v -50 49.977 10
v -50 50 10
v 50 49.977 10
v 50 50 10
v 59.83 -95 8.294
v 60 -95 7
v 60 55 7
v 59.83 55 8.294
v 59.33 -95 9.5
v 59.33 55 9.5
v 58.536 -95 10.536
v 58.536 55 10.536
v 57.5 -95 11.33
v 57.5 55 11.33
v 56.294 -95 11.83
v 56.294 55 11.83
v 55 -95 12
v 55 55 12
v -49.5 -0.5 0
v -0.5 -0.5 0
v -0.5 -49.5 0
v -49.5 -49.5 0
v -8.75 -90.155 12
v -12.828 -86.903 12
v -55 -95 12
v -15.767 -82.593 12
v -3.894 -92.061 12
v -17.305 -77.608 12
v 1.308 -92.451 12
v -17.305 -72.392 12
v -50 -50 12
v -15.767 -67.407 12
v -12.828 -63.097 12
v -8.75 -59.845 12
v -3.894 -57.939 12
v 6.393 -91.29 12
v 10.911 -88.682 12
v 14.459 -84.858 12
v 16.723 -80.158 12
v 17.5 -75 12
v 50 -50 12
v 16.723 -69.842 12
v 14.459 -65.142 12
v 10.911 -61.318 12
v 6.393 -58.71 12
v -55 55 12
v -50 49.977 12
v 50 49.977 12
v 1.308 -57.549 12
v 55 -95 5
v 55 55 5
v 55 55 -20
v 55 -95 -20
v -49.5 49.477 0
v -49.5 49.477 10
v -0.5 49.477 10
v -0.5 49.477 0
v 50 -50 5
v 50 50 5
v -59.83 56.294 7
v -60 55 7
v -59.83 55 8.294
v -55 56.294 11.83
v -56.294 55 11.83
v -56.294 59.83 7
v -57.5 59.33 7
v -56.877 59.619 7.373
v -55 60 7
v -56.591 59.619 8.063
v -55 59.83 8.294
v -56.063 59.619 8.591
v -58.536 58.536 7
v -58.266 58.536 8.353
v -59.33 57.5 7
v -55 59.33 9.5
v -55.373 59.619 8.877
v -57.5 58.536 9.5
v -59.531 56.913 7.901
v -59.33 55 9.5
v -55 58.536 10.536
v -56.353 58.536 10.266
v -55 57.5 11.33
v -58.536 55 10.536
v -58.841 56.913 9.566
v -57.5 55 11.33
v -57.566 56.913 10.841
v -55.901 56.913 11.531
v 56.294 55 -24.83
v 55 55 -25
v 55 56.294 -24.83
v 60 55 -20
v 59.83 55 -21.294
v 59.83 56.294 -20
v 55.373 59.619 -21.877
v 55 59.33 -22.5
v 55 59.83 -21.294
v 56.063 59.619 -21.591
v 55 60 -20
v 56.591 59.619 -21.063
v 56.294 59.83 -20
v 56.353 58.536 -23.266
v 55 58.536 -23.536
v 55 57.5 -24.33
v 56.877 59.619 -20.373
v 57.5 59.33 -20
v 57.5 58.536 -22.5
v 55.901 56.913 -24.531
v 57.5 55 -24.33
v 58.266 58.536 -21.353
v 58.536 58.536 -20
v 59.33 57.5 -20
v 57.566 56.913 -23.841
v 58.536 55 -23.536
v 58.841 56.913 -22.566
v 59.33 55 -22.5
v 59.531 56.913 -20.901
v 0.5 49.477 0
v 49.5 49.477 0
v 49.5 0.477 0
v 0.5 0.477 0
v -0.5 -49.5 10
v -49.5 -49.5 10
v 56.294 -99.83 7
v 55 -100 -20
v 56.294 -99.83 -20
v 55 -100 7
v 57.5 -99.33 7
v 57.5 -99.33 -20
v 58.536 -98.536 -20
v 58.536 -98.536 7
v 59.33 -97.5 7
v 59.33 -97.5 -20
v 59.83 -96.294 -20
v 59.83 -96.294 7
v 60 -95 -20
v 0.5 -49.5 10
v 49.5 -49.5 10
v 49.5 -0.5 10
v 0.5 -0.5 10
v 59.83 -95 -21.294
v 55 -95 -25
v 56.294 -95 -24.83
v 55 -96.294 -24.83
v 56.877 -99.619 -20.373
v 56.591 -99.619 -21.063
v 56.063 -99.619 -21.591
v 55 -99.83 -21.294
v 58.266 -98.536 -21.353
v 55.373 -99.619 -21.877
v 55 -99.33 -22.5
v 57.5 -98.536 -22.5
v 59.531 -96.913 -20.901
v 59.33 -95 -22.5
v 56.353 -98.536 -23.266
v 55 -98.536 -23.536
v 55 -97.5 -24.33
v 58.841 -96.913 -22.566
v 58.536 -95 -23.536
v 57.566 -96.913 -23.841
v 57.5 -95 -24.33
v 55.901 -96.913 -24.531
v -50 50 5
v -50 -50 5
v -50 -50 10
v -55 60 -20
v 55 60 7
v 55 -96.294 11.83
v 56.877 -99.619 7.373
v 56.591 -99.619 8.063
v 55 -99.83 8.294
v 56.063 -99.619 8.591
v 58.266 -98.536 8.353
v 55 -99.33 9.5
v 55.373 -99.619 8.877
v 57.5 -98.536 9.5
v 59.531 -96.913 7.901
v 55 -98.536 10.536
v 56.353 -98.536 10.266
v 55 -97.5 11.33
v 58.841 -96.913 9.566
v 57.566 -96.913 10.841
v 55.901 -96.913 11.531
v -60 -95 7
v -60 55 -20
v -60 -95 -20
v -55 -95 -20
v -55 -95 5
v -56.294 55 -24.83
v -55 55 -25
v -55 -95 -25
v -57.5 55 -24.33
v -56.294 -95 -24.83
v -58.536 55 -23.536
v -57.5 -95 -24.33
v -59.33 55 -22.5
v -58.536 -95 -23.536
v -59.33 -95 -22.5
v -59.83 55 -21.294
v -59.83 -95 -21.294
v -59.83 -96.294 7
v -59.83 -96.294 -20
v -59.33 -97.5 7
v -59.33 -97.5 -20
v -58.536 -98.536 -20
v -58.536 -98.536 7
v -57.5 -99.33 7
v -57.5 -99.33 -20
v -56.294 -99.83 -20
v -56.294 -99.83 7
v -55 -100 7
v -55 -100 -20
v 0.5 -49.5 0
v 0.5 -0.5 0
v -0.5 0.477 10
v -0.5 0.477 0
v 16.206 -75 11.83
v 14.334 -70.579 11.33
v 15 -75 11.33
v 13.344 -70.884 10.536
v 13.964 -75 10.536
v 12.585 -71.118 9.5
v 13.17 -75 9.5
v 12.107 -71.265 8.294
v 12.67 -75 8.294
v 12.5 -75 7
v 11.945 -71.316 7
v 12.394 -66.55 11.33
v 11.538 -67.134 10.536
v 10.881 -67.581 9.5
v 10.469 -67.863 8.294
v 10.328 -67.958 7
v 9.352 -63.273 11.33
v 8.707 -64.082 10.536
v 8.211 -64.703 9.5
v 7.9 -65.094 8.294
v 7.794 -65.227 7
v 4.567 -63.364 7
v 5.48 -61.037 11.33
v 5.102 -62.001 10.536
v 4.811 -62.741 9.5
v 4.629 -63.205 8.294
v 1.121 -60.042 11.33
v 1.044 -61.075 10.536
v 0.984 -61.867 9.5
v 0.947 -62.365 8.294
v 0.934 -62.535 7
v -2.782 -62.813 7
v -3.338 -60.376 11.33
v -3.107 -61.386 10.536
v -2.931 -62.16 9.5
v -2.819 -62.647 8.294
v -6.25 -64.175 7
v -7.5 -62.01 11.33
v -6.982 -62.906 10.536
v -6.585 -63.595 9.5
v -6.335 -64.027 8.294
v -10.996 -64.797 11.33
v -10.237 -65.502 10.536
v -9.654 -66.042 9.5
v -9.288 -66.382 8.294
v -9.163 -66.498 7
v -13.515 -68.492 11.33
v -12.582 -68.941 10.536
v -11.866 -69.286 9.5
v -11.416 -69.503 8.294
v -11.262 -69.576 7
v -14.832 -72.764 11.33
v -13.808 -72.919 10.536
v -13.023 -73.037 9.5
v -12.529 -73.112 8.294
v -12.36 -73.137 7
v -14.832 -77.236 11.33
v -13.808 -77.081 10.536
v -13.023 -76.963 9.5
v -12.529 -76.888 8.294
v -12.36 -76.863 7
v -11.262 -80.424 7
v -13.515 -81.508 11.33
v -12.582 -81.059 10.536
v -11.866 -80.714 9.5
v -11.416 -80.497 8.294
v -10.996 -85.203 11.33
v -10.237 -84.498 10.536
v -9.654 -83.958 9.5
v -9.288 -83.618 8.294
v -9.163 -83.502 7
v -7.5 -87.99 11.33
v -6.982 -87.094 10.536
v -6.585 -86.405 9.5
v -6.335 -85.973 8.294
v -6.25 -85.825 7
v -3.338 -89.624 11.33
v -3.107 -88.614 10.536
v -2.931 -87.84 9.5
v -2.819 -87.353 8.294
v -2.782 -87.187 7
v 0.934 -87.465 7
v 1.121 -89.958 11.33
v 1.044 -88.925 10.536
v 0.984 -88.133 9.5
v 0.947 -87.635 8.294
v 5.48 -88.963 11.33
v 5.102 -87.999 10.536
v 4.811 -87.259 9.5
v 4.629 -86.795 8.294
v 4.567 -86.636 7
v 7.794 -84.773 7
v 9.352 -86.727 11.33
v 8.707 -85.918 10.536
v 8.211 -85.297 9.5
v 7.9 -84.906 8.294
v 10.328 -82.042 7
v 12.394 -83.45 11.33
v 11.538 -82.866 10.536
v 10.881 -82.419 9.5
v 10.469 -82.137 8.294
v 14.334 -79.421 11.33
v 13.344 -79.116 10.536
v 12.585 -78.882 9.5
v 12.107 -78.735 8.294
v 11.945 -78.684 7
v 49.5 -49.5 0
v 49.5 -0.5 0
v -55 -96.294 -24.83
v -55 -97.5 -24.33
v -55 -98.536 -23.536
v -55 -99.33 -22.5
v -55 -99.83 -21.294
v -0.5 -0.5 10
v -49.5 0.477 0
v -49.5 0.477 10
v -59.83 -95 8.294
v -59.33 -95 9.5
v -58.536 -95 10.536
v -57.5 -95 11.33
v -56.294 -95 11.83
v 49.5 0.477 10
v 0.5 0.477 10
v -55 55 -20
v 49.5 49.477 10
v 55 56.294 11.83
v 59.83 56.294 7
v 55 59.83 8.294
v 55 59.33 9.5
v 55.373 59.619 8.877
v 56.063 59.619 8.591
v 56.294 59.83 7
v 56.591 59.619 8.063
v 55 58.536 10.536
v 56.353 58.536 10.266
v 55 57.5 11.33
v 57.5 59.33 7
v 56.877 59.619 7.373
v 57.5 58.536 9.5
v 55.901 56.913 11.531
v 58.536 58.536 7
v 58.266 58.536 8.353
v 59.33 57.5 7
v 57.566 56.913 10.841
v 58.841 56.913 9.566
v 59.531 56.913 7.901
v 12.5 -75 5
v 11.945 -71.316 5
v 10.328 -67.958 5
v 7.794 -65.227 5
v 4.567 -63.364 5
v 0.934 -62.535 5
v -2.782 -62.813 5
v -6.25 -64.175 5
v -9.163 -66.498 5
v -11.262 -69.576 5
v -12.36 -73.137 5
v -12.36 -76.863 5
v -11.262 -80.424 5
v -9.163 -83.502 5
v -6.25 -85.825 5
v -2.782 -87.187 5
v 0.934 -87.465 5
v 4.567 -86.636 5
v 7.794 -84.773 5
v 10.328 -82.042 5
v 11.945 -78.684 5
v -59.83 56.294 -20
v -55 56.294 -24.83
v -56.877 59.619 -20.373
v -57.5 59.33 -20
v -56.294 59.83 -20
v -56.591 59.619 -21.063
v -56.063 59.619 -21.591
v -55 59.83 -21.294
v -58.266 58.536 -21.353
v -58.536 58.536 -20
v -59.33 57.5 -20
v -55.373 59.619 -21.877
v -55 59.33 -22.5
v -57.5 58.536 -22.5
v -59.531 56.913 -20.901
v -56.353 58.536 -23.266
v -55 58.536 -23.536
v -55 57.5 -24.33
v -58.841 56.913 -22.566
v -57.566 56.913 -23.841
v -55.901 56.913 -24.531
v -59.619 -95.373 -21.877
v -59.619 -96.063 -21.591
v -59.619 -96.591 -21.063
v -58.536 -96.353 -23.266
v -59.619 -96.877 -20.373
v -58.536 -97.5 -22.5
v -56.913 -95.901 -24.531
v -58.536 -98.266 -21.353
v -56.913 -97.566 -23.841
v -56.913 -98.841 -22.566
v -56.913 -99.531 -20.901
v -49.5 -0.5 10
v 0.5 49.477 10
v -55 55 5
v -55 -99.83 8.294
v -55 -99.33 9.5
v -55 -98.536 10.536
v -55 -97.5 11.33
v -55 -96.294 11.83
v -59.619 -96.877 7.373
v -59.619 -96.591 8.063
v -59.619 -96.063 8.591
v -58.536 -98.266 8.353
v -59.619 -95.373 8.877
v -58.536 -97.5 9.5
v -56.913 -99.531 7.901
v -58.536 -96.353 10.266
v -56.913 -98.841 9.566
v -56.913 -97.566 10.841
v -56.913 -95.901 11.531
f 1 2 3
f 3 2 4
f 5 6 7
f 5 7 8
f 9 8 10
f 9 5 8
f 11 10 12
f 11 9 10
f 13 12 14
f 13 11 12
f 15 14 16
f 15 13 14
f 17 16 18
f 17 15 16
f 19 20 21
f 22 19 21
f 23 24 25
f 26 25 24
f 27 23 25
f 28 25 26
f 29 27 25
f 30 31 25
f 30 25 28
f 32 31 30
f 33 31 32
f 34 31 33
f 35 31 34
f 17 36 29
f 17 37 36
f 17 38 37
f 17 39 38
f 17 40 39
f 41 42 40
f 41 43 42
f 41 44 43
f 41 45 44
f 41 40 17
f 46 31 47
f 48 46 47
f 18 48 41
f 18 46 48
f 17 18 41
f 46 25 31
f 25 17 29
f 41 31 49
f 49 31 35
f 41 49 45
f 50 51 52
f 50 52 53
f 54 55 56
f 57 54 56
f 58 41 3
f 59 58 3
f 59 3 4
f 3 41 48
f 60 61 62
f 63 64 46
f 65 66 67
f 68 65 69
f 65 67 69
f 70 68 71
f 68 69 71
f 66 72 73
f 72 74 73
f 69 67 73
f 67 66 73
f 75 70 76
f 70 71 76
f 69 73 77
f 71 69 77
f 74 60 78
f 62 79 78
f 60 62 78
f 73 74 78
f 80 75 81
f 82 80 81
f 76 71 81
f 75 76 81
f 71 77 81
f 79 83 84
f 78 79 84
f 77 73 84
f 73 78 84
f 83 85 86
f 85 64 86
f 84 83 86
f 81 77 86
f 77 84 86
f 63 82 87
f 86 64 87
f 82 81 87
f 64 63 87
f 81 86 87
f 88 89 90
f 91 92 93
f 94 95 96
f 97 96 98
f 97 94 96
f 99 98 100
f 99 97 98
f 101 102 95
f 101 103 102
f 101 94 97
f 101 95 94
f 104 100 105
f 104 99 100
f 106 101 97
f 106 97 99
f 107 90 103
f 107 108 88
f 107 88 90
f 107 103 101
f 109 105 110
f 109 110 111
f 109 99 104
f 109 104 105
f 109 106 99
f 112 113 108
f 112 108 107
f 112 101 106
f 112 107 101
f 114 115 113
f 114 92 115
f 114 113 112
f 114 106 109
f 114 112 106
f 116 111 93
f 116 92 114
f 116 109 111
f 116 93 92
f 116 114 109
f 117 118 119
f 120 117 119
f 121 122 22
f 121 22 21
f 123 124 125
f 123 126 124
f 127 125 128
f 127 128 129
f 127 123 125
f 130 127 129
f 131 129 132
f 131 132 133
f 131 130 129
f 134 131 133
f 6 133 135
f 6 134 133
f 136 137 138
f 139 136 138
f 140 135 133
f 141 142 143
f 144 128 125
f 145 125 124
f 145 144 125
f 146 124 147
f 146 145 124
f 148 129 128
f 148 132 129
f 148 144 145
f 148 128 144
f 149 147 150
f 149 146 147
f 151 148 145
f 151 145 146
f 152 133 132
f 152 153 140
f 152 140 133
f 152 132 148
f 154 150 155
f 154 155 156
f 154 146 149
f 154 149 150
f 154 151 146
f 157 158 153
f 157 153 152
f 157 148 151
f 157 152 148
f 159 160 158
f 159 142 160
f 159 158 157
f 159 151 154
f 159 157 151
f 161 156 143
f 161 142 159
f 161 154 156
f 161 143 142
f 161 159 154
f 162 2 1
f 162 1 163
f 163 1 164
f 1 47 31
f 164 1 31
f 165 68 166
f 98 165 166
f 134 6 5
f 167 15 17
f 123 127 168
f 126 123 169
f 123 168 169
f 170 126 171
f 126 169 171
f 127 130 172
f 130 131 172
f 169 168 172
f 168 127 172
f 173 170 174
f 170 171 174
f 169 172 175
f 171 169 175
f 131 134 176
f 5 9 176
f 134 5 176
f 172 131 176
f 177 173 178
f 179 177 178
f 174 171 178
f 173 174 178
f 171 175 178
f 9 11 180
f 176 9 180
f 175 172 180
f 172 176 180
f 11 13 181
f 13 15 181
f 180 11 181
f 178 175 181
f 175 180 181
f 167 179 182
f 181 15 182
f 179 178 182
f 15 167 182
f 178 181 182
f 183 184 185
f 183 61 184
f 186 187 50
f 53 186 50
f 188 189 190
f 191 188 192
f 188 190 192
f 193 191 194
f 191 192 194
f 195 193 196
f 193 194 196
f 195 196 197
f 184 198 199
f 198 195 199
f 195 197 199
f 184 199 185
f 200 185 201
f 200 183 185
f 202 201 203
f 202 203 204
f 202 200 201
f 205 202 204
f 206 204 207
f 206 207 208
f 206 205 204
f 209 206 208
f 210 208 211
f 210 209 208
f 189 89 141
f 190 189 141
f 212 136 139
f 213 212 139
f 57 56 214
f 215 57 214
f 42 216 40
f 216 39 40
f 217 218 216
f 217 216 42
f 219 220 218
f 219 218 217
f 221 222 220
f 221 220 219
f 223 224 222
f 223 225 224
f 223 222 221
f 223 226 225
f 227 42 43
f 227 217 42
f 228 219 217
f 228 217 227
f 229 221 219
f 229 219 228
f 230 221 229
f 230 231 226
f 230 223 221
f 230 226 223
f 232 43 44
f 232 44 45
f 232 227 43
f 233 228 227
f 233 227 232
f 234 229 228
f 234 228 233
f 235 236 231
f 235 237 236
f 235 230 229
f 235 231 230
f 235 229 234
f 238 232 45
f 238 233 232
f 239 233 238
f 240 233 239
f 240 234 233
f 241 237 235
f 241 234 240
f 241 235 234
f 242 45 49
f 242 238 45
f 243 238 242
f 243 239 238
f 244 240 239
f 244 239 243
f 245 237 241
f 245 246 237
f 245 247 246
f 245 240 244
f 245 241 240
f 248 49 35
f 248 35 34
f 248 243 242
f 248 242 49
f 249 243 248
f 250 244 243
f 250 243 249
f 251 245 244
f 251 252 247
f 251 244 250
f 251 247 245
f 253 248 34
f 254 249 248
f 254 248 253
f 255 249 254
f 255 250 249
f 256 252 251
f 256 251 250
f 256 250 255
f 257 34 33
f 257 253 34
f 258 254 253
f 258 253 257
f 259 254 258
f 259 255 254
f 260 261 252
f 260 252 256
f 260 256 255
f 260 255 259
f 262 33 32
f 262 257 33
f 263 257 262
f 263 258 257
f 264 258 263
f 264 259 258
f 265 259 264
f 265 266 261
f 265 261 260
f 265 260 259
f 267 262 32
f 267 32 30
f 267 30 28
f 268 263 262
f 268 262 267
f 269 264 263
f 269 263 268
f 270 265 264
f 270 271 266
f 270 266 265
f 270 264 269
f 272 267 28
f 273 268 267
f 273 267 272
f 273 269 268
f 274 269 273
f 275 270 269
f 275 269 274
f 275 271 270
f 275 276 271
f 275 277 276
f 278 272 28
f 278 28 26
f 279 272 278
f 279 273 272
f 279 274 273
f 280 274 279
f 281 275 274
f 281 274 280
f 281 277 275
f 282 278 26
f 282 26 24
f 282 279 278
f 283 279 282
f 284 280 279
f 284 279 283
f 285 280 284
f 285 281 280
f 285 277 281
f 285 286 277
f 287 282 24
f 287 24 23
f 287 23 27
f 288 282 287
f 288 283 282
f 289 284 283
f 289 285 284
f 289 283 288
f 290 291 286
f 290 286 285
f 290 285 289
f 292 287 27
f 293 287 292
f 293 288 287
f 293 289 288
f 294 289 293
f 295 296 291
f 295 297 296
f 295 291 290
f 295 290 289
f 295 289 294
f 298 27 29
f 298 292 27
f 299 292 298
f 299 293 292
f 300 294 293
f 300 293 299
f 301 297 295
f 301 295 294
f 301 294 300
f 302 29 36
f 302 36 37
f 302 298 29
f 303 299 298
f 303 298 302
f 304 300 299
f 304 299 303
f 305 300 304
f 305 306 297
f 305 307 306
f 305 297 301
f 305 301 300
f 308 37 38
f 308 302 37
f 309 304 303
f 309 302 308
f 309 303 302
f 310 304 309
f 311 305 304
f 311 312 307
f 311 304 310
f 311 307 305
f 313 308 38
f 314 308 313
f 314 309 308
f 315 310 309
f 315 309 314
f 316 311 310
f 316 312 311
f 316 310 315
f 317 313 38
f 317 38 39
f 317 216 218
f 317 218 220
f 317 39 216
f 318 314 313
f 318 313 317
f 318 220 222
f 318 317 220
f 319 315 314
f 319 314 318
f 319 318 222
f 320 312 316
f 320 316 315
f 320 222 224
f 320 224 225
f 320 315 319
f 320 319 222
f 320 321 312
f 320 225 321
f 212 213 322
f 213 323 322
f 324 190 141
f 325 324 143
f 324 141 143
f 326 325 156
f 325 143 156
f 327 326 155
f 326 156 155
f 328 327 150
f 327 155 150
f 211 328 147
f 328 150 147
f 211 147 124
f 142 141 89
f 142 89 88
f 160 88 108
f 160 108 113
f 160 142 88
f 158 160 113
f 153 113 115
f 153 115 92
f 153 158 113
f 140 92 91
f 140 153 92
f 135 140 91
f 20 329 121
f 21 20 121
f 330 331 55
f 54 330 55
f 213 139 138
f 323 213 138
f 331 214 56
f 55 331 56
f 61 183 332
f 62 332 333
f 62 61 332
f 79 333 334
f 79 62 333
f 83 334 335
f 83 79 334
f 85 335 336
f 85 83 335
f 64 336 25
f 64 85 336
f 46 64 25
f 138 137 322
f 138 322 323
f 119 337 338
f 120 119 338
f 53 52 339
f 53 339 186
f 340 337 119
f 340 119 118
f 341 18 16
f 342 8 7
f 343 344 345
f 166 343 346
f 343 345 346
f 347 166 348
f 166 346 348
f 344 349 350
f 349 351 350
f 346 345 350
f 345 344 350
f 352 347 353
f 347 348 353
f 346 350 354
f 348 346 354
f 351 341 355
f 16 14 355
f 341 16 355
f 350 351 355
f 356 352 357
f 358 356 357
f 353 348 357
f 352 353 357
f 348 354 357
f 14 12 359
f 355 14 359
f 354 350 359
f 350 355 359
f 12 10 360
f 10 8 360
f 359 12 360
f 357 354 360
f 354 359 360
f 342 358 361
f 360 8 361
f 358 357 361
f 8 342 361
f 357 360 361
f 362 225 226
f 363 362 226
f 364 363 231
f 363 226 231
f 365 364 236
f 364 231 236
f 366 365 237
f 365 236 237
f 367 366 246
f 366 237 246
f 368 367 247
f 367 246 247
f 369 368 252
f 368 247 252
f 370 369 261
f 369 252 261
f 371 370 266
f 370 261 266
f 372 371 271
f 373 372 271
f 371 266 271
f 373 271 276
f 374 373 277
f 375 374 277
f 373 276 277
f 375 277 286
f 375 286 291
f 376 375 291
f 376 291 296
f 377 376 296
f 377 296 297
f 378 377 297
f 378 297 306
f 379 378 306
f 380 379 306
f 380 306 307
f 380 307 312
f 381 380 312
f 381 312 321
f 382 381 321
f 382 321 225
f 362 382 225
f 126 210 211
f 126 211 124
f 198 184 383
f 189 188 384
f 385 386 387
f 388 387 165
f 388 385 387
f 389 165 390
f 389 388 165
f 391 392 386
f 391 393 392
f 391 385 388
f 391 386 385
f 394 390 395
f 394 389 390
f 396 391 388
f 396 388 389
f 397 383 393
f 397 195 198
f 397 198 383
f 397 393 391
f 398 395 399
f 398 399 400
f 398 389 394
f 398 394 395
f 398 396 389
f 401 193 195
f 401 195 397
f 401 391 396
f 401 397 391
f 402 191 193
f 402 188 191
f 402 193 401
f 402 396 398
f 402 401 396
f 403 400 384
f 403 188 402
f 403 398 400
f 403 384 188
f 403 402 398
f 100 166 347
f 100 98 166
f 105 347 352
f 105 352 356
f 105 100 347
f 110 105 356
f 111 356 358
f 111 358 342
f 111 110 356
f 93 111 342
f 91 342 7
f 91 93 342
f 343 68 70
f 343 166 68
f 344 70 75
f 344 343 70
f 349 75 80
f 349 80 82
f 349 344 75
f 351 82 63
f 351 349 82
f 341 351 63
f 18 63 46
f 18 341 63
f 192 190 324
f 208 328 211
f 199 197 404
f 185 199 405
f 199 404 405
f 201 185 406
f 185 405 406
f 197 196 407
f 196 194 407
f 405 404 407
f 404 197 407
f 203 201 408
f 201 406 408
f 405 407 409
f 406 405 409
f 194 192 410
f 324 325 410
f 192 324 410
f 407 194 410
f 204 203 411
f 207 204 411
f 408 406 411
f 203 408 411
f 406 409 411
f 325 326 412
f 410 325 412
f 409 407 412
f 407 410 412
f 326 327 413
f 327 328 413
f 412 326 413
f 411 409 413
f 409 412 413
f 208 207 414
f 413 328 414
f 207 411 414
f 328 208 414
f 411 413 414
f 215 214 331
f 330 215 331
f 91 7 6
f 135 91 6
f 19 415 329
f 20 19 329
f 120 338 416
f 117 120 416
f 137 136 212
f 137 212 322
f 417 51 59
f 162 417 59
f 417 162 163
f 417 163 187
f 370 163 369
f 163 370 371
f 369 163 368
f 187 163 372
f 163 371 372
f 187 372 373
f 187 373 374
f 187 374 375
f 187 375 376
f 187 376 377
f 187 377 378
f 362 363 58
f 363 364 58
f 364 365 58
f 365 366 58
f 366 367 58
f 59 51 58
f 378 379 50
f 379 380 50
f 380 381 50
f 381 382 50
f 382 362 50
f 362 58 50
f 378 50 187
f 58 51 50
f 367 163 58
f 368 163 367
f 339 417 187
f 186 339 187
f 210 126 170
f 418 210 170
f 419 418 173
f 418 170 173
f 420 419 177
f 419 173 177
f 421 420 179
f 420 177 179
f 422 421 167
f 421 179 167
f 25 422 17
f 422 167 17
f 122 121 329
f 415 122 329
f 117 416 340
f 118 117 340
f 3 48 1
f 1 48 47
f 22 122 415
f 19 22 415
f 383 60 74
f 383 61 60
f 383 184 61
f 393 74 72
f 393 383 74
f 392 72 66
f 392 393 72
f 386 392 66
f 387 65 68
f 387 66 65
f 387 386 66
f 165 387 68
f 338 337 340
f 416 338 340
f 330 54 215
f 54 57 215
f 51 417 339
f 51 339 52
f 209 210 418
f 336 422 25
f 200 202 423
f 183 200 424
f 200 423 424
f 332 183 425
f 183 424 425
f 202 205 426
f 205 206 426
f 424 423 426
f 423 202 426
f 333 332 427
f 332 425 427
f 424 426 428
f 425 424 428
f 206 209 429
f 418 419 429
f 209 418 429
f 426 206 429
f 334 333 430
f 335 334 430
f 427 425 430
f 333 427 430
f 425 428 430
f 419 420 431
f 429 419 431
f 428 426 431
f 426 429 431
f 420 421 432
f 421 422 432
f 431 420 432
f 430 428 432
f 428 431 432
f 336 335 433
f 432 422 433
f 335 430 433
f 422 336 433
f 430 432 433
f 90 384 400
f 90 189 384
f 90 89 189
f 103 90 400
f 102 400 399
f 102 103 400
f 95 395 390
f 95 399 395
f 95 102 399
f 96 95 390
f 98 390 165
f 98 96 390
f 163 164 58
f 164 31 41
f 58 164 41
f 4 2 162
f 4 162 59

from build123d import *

# Parameters (mm, degrees)
F0_W      = 100
F0_H      = 100
F1_DEPTH  = 10
F2_W      = 100
F2_H      = 5
F3_DEPTH  = 50
F4_W      = 100
F4_H      = 50
F5_DEPTH  = 2
F7_DEPTH  = 10
F8_W      = 10
F8_H      = 100
F9_DEPTH  = 2
F11_DEPTH = 10
F12_W     = 100
F12_H     = 10.0225633383
F13_DEPTH = 2
F15_DEPTH = 10
F16_W     = 10
F16_H     = 99.9774366617
F17_DEPTH = 2
F19_DEPTH = 10
F20_W     = 10
F20_H     = 100
F21_DEPTH = 5
F22_R     = 12.5
F23_DEPTH = 7.00859
F24_W     = 100
F24_H     = 100
F24_W_2   = 99
F24_H_2   = 98.9774366617
F25_DEPTH = 10
F26_W     = 120
F26_H     = 160
F26_W_2   = 110
F26_H_2   = 150
F27_DEPTH = 30
F28_W     = 150
F28_H     = 5
F29_DEPTH = 110
F30_R     = 5


with BuildPart() as f1:
    # F0 (on Top) → F1 (new body)
    with BuildSketch(Plane.XY):
        Rectangle(F0_W, F0_H)
    extrude(amount=F1_DEPTH)

    # F2 (on face) → F3 (join)
    with BuildSketch(Plane.XZ.offset(50)):
        with Locations((0, 7.5)):
            Rectangle(F2_W, F2_H)
    extrude(amount=F3_DEPTH)

    # F4 (on face) → F5 (join)
    with BuildSketch(Plane.XY.offset(10)):
        with Locations((0, -75)):
            Rectangle(F4_W, F4_H)
    extrude(amount=F5_DEPTH)

    # F6 (on face) → F7 (join)
    with BuildSketch(Plane.YZ.offset(50)):
        Polygon((-100, 5), (-50, 5), (50, 5), (50, 10), (-50, 10), (-50, 12), (-100, 12), align=None)
    extrude(amount=F7_DEPTH)

    # F8 (on face) → F9 (join)
    with BuildSketch(Plane.XY.offset(10)):
        with Locations((55, 0)):
            Rectangle(F8_W, F8_H)
    extrude(amount=F9_DEPTH)

    # F10 (on face) → F11 (join)
    with BuildSketch(Plane(origin=(0, 50, 0), x_dir=(-1, 0, 0), z_dir=(0, 1, 0))):
        Polygon((-60, 5), (-50, 5), (50, 5), (50, 10), (-50, 10), (-50, 12), (-60, 12), align=None)
    extrude(amount=F11_DEPTH)

    # F12 (on face) → F13 (join)
    with BuildSketch(Plane.XY.offset(10)):
        with Locations((0, 54.9887183309)):
            Rectangle(F12_W, F12_H)
    extrude(amount=F13_DEPTH)

    # F14 (on face) → F15 (join)
    with BuildSketch(Plane(origin=(-50, 0, 0), x_dir=(0, -1, 0), z_dir=(-1, 0, 0))):
        Polygon((-60, 5), (-50, 5), (-50, 0), (50, 0), (50, 5), (100, 5), (100, 12), (50, 12), (50, 10), (-49.9774366617, 10), (-49.9774366617, 12), (-60, 12), align=None)
    extrude(amount=F15_DEPTH)

    # F16 (on face) → F17 (join)
    with BuildSketch(Plane.XY.offset(10)):
        with Locations((-55, -0.0112816691)):
            Rectangle(F16_W, F16_H)
    extrude(amount=F17_DEPTH)

    # F18 (on face) → F19 (cut)
    with BuildSketch(Plane.XY.offset(10)):
        Polygon((-0.5, -50), (0.5, -50), (0.5, -0.5), (50, -0.5), (50, 0.4774366617), (0.5, 0.4774366617), (0.5, 49.9774366617), (-0.5, 49.9774366617), (-0.5, 0.4774366617), (-50, 0.4774366617), (-50, -0.5), (-0.5, -0.5), align=None)
    extrude(amount=-F19_DEPTH, mode=Mode.SUBTRACT)

    # F20 (on face) → F21 (cut)
    with BuildSketch(Plane(origin=(0, 0, 0), x_dir=(1, 0, 0), z_dir=(0, 0, -1))):
        with Locations((-55, 0)):
            Rectangle(F20_W, F20_H)
    extrude(amount=-F21_DEPTH, mode=Mode.SUBTRACT)

    # F22 (on face) → F23 (cut)
    with BuildSketch(Plane.XY.offset(12)):
        with Locations((0, -75)):
            Circle(F22_R)
    extrude(amount=-F23_DEPTH, mode=Mode.SUBTRACT)

    # F24 (on face) → F25 (cut)
    with BuildSketch(Plane.XY.offset(10)):
        Rectangle(F24_W, F24_H)
        with Locations((0, -0.0112816691)):
            Rectangle(F24_W_2, F24_H_2, mode=Mode.SUBTRACT)
    extrude(amount=-F25_DEPTH, mode=Mode.SUBTRACT)

    # F26 (on face) → F27 (join)
    with BuildSketch(Plane(origin=(0, 0, 5), x_dir=(1, 0, 0), z_dir=(0, 0, -1))):
        with Locations((0, 20)):
            Rectangle(F26_W, F26_H)
        with Locations((0, 20)):
            Rectangle(F26_W_2, F26_H_2, mode=Mode.SUBTRACT)
    extrude(amount=F27_DEPTH)

    # F28 (on face) → F29 (join)
    with BuildSketch(Plane(origin=(55, 0, 0), x_dir=(0, -1, 0), z_dir=(-1, 0, 0))):
        with Locations((20, -22.5)):
            Rectangle(F28_W, F28_H)
    extrude(amount=F29_DEPTH)

    # F30
    f30_edges = [f1.edges().sort_by_distance(p)[0] for p in [
        (60, -20, 12),
        (60, -20, -25),
        (60, -100, -6.5),
        (0, -100, 12),
        (0, -100, -25),
        (-60, -20, -25),
        (-60, -100, -6.5),
        (-60, -20, 12),
        (-60, 60, -6.5),
        (0, 60, 12),
        (0, 60, -25),
        (60, 60, -6.5),
        (-12.5, -75, 12),
    ]]
    fillet(f30_edges, radius=F30_R)


solid = f1.part
